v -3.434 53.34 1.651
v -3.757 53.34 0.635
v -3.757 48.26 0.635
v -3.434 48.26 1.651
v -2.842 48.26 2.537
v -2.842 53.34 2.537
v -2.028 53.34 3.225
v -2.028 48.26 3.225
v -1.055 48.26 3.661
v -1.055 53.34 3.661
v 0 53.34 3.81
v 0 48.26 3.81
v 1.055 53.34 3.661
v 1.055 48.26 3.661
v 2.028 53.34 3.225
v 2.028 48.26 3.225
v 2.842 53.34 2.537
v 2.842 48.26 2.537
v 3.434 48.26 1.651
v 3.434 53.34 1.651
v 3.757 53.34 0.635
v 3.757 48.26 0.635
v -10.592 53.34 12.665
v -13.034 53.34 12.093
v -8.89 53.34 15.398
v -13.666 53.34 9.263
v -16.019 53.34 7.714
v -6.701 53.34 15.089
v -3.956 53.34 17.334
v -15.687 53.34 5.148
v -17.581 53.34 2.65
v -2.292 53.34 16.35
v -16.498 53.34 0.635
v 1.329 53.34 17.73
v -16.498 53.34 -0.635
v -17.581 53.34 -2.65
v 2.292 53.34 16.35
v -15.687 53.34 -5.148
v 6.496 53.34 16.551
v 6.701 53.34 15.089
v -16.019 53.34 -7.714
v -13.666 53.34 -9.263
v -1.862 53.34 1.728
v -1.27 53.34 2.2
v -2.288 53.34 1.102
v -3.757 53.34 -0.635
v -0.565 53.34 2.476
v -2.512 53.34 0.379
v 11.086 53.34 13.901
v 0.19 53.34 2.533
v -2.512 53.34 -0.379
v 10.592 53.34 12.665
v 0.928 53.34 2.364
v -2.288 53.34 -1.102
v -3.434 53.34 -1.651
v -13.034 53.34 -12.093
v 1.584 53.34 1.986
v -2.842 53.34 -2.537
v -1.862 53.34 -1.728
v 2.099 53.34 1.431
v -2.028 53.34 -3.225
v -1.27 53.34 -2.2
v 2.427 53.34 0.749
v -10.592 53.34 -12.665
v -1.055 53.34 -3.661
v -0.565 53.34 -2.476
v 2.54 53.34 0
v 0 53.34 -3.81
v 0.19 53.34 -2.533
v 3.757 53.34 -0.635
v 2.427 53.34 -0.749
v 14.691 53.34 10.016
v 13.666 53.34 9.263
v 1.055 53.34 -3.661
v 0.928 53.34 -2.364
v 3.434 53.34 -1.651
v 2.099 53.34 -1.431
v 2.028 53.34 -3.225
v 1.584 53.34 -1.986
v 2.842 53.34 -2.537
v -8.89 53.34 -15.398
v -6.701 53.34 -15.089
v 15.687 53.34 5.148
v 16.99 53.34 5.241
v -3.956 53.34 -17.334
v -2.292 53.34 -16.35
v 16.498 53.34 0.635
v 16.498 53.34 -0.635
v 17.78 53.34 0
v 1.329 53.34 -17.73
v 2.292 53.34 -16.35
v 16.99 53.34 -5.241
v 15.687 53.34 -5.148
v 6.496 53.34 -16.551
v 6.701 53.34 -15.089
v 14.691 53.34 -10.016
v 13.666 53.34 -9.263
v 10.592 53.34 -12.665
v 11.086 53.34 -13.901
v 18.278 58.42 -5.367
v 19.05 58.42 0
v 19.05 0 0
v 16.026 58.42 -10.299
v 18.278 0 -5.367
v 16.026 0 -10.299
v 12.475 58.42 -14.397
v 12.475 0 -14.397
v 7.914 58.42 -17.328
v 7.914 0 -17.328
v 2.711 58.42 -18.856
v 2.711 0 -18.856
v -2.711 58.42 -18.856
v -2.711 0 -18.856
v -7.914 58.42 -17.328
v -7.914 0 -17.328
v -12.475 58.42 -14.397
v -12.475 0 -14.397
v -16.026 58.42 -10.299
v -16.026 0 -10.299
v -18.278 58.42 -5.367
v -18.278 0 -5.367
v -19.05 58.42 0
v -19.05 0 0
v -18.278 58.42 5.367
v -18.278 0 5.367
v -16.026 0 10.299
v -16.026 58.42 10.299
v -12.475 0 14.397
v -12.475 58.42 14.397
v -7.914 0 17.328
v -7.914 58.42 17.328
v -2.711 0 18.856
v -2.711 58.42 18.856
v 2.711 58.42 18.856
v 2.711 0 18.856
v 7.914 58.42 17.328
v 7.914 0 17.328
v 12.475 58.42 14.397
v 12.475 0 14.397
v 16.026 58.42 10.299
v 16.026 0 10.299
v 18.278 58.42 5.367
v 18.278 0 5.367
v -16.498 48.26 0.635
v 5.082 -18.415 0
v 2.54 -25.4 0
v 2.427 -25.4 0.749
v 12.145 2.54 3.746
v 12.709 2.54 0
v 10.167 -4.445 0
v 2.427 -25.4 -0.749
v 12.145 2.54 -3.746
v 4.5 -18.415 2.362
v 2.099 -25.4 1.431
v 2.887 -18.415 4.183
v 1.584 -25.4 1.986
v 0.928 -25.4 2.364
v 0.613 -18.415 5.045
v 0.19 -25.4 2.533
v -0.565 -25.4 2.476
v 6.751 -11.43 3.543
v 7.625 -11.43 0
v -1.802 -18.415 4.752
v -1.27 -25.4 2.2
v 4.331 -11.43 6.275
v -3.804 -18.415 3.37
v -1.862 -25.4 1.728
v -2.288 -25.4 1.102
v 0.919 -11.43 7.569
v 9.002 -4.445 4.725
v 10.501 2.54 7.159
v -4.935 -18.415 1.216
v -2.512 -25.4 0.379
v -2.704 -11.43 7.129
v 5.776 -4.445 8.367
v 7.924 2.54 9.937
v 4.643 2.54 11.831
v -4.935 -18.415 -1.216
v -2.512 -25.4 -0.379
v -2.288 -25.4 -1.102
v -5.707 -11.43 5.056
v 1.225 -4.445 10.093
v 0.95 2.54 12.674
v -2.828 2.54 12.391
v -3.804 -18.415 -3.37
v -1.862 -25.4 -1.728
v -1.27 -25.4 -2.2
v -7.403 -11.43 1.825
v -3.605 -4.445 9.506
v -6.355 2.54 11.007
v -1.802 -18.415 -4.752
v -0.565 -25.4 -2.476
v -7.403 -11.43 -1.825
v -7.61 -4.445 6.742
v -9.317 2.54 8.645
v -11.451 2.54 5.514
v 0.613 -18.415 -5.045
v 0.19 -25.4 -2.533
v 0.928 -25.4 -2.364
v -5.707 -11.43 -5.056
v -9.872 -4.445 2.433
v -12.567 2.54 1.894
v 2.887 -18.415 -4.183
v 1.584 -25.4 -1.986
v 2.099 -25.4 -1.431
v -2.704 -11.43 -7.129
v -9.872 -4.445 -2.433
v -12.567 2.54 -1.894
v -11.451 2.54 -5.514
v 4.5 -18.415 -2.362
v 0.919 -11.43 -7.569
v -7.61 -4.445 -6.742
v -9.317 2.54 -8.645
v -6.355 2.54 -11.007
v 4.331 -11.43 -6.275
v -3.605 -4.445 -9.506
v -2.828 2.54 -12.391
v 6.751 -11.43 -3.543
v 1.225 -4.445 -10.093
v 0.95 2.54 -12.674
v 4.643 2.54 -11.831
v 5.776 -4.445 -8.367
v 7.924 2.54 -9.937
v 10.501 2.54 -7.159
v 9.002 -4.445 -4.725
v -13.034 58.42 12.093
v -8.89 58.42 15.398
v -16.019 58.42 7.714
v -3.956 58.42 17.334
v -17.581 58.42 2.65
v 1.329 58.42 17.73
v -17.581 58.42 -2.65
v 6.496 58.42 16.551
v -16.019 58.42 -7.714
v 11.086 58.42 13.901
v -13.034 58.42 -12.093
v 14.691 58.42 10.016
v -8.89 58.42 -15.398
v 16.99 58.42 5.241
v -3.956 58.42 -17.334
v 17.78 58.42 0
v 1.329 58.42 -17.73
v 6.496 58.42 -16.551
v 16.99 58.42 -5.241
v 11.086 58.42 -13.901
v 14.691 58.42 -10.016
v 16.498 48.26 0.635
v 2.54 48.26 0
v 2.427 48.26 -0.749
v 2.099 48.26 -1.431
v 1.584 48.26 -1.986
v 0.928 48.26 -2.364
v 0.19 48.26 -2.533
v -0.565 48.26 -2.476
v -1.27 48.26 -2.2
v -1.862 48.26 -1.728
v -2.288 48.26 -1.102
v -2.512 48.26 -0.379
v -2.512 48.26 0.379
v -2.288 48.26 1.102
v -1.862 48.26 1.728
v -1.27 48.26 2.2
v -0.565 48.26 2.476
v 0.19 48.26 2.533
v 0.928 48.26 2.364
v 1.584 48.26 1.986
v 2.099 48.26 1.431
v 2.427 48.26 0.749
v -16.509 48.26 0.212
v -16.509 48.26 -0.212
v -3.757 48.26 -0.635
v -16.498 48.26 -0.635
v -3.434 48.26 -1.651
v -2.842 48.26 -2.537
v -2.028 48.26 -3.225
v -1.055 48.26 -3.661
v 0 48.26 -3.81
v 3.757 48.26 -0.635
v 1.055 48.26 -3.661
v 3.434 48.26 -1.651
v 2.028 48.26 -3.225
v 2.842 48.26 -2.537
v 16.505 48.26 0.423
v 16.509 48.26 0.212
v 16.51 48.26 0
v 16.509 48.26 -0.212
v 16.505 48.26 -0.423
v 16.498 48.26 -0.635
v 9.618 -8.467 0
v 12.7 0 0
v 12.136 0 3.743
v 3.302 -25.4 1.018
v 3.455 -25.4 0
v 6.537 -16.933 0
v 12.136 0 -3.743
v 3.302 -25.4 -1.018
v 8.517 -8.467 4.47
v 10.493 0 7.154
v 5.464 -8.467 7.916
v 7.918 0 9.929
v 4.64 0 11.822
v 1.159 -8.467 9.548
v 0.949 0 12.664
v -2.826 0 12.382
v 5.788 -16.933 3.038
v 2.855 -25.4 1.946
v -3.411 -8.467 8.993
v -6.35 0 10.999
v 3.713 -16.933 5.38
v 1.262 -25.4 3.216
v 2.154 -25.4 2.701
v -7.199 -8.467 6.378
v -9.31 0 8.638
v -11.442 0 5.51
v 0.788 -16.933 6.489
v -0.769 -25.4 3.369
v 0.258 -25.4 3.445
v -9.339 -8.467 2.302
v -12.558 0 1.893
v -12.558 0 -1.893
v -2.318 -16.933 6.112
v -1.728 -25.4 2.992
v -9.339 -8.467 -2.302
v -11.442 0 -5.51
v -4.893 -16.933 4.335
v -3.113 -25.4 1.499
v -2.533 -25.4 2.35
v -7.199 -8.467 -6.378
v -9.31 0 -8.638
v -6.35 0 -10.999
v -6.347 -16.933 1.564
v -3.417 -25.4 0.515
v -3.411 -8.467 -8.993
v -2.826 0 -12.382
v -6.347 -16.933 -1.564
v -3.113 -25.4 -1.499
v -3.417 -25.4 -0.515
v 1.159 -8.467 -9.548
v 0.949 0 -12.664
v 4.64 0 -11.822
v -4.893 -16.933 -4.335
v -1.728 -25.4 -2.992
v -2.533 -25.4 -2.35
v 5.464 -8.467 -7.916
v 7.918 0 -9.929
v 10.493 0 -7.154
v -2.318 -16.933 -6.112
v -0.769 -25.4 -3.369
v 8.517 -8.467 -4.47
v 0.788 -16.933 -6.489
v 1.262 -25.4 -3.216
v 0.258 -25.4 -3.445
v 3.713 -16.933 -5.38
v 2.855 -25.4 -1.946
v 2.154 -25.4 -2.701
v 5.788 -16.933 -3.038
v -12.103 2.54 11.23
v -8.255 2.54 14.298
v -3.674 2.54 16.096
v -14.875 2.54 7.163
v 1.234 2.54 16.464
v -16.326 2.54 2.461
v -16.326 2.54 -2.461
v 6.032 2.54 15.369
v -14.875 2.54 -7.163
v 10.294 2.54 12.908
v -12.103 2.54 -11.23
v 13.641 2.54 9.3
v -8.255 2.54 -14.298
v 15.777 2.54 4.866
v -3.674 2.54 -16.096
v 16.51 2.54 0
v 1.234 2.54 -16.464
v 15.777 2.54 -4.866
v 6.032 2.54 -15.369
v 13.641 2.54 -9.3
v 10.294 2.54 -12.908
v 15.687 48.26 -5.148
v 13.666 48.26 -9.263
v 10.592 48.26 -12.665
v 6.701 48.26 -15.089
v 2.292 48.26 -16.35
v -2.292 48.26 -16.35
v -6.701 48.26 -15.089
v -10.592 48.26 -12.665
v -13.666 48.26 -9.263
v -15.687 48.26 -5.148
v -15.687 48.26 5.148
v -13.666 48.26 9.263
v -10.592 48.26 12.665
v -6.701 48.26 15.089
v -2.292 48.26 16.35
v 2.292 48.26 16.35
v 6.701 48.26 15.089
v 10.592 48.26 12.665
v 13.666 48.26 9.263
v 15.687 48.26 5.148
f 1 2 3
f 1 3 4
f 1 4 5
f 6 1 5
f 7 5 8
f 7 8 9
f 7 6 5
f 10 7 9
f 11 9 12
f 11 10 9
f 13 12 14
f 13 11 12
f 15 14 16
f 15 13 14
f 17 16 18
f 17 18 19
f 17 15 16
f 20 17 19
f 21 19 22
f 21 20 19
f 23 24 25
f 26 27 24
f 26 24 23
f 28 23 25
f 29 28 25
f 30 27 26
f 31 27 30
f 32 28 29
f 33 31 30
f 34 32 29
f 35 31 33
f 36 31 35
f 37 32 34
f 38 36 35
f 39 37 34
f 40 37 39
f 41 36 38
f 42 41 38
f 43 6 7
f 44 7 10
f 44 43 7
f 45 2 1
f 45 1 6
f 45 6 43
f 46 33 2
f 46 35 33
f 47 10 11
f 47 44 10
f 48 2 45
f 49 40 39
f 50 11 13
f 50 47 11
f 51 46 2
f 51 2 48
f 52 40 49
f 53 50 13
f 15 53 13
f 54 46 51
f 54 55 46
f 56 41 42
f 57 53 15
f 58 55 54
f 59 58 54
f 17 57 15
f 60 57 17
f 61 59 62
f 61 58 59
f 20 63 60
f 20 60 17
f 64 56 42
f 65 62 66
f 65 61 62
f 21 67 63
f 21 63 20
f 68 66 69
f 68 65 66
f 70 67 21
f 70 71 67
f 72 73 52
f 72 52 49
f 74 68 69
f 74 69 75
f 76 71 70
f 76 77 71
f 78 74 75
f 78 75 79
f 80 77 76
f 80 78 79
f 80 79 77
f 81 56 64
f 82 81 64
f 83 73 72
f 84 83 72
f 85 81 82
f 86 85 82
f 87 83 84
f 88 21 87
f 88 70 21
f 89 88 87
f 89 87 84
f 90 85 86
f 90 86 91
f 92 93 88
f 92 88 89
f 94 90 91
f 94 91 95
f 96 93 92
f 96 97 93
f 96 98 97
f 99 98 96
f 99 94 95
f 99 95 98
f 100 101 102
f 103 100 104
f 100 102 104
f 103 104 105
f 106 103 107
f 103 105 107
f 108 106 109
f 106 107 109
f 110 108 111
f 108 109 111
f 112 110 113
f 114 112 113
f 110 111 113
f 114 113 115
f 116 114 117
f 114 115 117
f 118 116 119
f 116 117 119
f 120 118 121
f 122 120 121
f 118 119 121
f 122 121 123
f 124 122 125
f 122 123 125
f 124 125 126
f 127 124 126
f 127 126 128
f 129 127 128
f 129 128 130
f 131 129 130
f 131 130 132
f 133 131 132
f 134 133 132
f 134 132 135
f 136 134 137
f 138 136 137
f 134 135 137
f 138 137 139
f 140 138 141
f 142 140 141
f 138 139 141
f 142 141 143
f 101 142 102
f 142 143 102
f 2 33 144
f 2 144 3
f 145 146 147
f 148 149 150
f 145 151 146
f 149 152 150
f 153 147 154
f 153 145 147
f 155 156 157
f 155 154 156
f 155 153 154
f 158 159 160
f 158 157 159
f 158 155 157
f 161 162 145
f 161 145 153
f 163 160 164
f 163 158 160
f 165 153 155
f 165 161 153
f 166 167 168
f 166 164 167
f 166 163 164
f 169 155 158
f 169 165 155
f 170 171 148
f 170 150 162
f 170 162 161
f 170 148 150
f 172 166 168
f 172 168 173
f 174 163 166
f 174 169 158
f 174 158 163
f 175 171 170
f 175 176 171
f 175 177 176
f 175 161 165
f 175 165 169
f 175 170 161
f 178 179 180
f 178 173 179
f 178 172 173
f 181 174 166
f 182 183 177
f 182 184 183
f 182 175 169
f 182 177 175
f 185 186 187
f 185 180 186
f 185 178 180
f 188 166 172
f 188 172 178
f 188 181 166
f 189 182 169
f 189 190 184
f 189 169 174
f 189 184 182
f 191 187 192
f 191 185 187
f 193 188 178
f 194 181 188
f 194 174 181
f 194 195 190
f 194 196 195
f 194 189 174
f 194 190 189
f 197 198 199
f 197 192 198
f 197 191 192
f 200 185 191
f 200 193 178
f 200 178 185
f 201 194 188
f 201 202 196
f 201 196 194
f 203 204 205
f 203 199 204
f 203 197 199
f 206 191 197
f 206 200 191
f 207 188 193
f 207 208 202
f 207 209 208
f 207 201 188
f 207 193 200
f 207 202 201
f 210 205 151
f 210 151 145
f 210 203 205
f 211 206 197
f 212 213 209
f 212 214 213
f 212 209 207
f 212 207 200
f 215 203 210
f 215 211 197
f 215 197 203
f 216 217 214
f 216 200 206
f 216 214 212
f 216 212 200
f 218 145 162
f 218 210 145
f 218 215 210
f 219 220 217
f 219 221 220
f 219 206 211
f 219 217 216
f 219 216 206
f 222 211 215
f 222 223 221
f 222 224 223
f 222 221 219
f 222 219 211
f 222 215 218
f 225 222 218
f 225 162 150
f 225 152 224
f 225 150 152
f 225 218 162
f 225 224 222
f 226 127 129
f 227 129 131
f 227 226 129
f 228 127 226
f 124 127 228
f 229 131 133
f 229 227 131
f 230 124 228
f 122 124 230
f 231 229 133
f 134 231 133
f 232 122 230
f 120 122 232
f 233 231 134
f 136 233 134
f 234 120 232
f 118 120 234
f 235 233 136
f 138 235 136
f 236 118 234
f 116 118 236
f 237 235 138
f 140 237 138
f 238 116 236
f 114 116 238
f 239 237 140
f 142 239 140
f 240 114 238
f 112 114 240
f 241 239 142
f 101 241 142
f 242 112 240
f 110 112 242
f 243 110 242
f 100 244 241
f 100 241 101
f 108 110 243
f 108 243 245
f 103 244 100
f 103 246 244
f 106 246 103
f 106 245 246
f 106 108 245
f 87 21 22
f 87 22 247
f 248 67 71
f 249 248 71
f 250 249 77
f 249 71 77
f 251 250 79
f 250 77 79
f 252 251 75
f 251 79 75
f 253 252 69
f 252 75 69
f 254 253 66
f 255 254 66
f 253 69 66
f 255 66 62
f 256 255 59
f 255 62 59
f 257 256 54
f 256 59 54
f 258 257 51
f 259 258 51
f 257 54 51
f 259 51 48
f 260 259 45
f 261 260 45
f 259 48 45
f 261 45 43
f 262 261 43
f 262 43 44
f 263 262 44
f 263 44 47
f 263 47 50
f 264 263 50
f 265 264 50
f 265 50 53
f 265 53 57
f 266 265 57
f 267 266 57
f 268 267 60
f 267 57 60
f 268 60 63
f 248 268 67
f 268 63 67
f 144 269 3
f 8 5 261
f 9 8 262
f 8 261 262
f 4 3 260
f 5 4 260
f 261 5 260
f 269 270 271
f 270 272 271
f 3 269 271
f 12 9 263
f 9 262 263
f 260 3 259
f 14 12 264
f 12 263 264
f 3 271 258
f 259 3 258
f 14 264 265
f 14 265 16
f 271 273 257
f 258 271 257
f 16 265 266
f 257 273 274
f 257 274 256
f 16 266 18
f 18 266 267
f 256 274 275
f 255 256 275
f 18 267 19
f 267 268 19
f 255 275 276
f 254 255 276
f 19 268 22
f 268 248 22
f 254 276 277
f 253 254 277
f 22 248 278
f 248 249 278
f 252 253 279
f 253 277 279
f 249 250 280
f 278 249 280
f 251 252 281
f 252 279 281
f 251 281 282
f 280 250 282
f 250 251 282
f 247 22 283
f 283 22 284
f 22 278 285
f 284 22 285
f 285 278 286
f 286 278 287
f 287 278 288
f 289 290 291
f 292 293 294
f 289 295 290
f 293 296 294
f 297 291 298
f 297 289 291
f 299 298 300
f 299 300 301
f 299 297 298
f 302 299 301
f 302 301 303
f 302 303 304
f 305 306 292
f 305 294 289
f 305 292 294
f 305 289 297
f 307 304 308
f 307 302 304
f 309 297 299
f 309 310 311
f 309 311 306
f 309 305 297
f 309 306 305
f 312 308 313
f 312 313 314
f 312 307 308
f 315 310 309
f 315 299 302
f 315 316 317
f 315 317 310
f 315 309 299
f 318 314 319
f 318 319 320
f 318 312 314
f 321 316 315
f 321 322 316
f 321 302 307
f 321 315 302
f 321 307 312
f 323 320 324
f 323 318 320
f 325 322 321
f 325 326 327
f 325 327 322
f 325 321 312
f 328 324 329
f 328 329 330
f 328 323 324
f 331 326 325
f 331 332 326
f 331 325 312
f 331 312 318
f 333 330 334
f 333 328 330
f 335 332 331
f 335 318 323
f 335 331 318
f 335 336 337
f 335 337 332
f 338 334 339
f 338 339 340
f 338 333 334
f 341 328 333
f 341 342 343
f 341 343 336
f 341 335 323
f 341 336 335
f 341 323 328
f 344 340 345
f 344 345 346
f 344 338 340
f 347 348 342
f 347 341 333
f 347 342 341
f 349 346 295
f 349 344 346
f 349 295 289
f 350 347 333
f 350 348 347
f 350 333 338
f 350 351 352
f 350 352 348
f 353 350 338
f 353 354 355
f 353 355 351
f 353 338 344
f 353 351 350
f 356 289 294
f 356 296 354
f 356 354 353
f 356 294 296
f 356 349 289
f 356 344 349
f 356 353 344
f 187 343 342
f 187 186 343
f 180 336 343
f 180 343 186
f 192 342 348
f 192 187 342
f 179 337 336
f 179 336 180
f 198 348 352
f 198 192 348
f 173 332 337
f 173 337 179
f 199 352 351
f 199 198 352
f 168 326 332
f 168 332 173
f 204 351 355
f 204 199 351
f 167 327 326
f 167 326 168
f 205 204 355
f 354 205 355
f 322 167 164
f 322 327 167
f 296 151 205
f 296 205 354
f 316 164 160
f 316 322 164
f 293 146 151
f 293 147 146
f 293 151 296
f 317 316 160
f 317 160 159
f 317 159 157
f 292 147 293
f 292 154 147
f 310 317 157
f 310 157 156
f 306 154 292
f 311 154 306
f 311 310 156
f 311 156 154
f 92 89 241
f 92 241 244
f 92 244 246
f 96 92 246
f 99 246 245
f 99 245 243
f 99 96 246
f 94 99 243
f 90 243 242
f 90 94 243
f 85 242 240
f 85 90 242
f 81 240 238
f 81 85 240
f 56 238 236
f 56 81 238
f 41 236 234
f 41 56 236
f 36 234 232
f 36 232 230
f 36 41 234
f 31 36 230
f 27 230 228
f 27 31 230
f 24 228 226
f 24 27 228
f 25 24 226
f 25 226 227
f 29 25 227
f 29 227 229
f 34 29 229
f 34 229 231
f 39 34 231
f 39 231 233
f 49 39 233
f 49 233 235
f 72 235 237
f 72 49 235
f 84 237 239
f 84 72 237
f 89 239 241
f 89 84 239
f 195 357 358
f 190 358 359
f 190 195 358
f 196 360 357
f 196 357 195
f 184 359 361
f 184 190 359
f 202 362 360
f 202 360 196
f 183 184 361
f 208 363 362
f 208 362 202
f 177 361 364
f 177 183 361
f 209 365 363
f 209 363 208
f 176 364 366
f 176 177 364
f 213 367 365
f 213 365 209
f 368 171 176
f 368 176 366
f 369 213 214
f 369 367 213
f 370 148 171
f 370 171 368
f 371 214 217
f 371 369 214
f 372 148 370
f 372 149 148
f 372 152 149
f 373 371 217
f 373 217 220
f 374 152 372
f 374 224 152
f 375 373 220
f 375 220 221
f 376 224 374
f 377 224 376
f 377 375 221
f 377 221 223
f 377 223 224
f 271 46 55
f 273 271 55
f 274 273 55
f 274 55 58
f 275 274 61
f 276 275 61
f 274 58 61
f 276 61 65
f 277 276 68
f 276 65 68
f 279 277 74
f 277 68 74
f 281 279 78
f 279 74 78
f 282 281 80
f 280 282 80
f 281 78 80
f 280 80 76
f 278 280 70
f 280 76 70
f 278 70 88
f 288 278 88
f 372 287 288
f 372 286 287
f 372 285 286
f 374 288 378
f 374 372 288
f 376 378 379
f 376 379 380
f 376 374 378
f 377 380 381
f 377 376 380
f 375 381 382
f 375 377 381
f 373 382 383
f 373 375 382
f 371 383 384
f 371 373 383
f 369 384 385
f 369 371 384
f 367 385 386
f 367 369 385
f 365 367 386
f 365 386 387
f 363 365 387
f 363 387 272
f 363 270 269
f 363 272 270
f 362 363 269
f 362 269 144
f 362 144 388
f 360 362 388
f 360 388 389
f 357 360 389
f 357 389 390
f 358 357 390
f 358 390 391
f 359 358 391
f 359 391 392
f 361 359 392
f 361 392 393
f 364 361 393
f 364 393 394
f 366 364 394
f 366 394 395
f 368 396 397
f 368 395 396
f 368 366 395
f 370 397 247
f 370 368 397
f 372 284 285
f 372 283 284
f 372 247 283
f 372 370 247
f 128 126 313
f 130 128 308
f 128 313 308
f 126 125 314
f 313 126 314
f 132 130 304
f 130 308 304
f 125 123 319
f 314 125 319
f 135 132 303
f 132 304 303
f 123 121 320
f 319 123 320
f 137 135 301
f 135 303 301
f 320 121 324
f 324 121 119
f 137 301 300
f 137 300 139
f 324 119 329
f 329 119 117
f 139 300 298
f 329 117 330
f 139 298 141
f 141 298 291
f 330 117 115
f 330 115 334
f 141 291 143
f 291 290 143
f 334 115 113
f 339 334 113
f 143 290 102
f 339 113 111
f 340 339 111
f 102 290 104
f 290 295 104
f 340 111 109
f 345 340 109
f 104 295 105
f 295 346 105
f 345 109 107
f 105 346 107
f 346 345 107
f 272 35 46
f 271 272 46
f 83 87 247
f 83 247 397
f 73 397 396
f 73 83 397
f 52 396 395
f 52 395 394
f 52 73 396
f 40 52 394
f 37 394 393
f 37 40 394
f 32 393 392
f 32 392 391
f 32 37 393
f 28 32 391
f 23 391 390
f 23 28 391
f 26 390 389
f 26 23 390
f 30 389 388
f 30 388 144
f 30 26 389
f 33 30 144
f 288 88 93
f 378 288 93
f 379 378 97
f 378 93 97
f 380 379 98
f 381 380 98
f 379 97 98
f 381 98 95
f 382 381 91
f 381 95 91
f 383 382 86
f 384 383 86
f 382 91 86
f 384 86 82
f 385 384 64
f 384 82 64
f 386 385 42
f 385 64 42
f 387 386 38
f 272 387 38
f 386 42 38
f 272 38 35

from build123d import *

# Parameters (mm, degrees)
SKETCH1_R           = 19.05
BOSS_EXTRUDE1_DEPTH = 2.54
SKETCH2_R           = 12.7
BOSS_EXTRUDE2_DEPTH = 25.4
BOSS_EXTRUDE2_TAPER = 20
SKETCH3_R           = 2.54
CUT_EXTRUDE1_DEPTH  = 27.94
CUT_EXTRUDE1_TAPER  = -20
SKETCH4_R           = 19.05
SKETCH4_R_2         = 16.51
BOSS_EXTRUDE3_DEPTH = 50.8
SKETCH5_R           = 19.05
SKETCH5_R_2         = 2.54
BOSS_EXTRUDE4_DEPTH = 5.08
SKETCH6_R           = 19.05
SKETCH6_R_2         = 17.78
BOSS_EXTRUDE5_DEPTH = 5.08


with BuildPart() as part:
    # Sketch1 → Boss-Extrude1 (new body)
    with BuildSketch(Plane(origin=(0, 0, 0), x_dir=(1, 0, 0), z_dir=(0, 1, 0))):
        Circle(SKETCH1_R)
    extrude(amount=BOSS_EXTRUDE1_DEPTH)

    # Sketch2 → Boss-Extrude2 (add)
    with BuildSketch(Plane.XZ):
        Circle(SKETCH2_R)
    extrude(amount=BOSS_EXTRUDE2_DEPTH, taper=BOSS_EXTRUDE2_TAPER)

    # Sketch3 → Cut-Extrude1 (cut)
    with BuildSketch(Plane.XZ.offset(25.4)):
        Circle(SKETCH3_R)
    extrude(amount=-CUT_EXTRUDE1_DEPTH, taper=CUT_EXTRUDE1_TAPER, mode=Mode.SUBTRACT)

    # Sketch4 → Boss-Extrude3 (add)
    with BuildSketch(Plane(origin=(0, 2.54, 0), x_dir=(1, 0, 0), z_dir=(0, 1, 0))):
        Circle(SKETCH4_R)
        Circle(SKETCH4_R_2, mode=Mode.SUBTRACT)
    extrude(amount=BOSS_EXTRUDE3_DEPTH)

    # Sketch5 → Boss-Extrude4 (add)
    with BuildSketch(Plane(origin=(0, 53.34, 0), x_dir=(1, 0, 0), z_dir=(0, 1, 0))):
        Circle(SKETCH5_R)
        Circle(SKETCH5_R_2, mode=Mode.SUBTRACT)
        with BuildLine():
            Line((3.756710662, 0.635), (16.497783942, 0.635))
            ThreePointArc((16.497783942, 0.635), (0, 16.51), (-16.497783942, 0.635))
            Line((-16.497783942, 0.635), (-3.756710662, 0.635))
            ThreePointArc((-3.756710662, 0.635), (0, 3.81), (3.756710662, 0.635))
        make_face(mode=Mode.SUBTRACT)
        with BuildLine():
            Line((3.756710662, -0.635), (16.497783942, -0.635))
            ThreePointArc((16.497783942, -0.635), (0, -16.51), (-16.497783942, -0.635))
            Line((-16.497783942, -0.635), (-3.756710662, -0.635))
            ThreePointArc((-3.756710662, -0.635), (0, -3.81), (3.756710662, -0.635))
        make_face(mode=Mode.SUBTRACT)
    extrude(amount=-BOSS_EXTRUDE4_DEPTH)

    # Sketch6 → Boss-Extrude5 (add)
    with BuildSketch(Plane(origin=(0, 53.34, 0), x_dir=(1, 0, 0), z_dir=(0, 1, 0))):
        Circle(SKETCH6_R)
        Circle(SKETCH6_R_2, mode=Mode.SUBTRACT)
    extrude(amount=BOSS_EXTRUDE5_DEPTH)


solid = part.part
